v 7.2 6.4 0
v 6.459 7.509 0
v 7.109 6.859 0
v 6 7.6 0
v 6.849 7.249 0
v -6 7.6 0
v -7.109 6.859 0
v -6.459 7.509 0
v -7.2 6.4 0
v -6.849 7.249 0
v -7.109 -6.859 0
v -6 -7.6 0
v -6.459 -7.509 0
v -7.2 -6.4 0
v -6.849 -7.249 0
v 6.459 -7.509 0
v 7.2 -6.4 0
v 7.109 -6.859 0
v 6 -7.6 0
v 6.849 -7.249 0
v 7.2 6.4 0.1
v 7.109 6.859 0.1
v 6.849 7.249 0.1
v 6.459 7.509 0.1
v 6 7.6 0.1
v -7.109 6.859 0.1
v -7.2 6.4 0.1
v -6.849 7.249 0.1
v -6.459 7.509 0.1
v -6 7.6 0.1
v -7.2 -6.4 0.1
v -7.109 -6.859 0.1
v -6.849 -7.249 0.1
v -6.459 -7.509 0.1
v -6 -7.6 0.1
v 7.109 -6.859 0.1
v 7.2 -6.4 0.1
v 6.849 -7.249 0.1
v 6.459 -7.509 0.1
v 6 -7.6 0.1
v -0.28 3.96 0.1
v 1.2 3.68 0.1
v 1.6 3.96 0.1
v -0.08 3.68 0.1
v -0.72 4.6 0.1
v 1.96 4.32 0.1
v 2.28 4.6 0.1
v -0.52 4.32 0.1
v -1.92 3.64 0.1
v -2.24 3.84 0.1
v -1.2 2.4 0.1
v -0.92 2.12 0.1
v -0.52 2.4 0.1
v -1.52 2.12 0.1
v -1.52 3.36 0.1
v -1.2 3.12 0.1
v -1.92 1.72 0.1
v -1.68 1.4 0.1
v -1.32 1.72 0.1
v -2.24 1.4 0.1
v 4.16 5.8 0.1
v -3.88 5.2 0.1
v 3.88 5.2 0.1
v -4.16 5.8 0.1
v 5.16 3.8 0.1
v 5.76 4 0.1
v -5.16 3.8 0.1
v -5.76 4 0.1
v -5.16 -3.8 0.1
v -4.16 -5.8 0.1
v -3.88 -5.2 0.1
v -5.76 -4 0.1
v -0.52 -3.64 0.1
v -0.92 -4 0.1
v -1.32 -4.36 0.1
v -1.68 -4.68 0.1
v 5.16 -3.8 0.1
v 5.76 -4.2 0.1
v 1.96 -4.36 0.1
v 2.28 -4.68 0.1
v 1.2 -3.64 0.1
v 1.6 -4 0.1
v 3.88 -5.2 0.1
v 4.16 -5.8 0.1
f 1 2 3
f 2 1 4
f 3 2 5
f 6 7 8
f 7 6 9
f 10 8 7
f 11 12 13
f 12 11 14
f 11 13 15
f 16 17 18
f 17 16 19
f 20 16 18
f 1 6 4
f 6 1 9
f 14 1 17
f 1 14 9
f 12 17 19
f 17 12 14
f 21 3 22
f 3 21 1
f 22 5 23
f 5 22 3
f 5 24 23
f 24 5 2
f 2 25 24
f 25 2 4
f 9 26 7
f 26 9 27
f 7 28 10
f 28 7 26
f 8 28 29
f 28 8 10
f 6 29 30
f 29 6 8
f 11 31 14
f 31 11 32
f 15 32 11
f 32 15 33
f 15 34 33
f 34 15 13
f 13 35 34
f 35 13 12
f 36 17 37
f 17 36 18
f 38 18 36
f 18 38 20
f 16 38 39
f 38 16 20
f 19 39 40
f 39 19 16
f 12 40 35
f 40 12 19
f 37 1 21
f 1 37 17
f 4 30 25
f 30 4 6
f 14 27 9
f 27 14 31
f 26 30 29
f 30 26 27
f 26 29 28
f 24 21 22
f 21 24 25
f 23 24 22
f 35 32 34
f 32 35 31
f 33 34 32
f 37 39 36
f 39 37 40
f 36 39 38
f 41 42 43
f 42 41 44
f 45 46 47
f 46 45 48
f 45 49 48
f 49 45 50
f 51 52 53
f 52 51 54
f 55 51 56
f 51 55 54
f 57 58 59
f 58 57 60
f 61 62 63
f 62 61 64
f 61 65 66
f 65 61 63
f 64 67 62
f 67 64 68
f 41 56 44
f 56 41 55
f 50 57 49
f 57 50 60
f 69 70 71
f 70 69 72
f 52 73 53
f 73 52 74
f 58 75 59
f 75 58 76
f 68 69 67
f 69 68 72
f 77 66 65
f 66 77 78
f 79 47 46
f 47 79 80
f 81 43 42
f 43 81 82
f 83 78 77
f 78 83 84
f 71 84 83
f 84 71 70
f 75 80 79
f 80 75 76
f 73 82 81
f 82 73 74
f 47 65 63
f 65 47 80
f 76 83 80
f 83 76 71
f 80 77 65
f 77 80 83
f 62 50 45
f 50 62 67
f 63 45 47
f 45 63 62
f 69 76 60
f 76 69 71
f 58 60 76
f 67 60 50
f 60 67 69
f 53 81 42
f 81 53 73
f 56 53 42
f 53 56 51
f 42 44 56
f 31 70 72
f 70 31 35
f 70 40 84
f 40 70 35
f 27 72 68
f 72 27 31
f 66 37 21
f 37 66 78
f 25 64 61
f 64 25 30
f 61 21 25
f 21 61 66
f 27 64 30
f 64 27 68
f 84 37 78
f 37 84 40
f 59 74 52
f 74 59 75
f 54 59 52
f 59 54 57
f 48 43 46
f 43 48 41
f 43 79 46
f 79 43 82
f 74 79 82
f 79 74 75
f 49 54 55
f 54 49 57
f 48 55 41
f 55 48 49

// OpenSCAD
// file: ../p/1-4cyli.scad
use <../lib.scad>
function ldraw_lib__1_4cyli() = [
// 0 Cylinder 0.25
// 0 Name: 1-4cyli.dat
// 0 Author: James Jessiman
// 0 !LDRAW_ORG Primitive UPDATE 2012-01
// 0 !LICENSE Licensed under CC BY 4.0 : see CAreadme.txt
// 
// 0 BFC CERTIFY CCW
  [0,"BFC","CERTIFY"],
  [0,"BFC","CCW"],
// 
// 0 !HISTORY 2002-03-23 [sbliss] Added BFC statement.
// 0 !HISTORY 2002-04-25 [PTadmin] Official Update 2002-02
// 0 !HISTORY 2007-06-22 [PTadmin] Header formatted for Contributor Agreement
// 0 !HISTORY 2008-07-01 [PTadmin] Official Update 2008-01
// 0 !HISTORY 2012-02-16 [Philo] Changed to CCW
// 0 !HISTORY 2012-03-30 [PTadmin] Official Update 2012-01
// 
// 
// 4 16 1 1 0 0.9239 1 0.3827 0.9239 0 0.3827 1 0 0
  [4,16,1,1,0,0.9239,1,0.3827,0.9239,0,0.3827,1,0,0],
// 5 24 1 0 0 1 1 0 0.9239 0 0.3827 1 0 -1
  [5,24,1,0,0,1,1,0,0.9239,0,0.3827,1,0,-1],
// 4 16 0.9239 1 0.3827 0.7071 1 0.7071 0.7071 0 0.7071 0.9239 0 0.3827
  [4,16,0.9239,1,0.3827,0.7071,1,0.7071,0.7071,0,0.7071,0.9239,0,0.3827],
// 5 24 0.9239 0 0.3827 0.9239 1 0.3827 0.7071 0 0.7071 1 0 0
  [5,24,0.9239,0,0.3827,0.9239,1,0.3827,0.7071,0,0.7071,1,0,0],
// 4 16 0.7071 1 0.7071 0.3827 1 0.9239 0.3827 0 0.9239 0.7071 0 0.7071
  [4,16,0.7071,1,0.7071,0.3827,1,0.9239,0.3827,0,0.9239,0.7071,0,0.7071],
// 5 24 0.7071 0 0.7071 0.7071 1 0.7071 0.3827 0 0.9239 0.9239 0 0.3827
  [5,24,0.7071,0,0.7071,0.7071,1,0.7071,0.3827,0,0.9239,0.9239,0,0.3827],
// 4 16 0.3827 1 0.9239 0 1 1 0 0 1 0.3827 0 0.9239
  [4,16,0.3827,1,0.9239,0,1,1,0,0,1,0.3827,0,0.9239],
// 5 24 0.3827 0 0.9239 0.3827 1 0.9239 0 0 1 0.7071 0 0.7071
  [5,24,0.3827,0,0.9239,0.3827,1,0.9239,0,0,1,0.7071,0,0.7071],
// 5 24 0 0 1 0 1 1 0.3827 0 0.9239 -1 0 1
  [5,24,0,0,1,0,1,1,0.3827,0,0.9239,-1,0,1],
];
module ldraw_lib__1_4cyli(step=0, col=false, unit=2/5, alt=false, line=0.2, solid=!$preview)
    makepoly(ldraw_lib__1_4cyli(), step=step, col=col, unit=unit, alt=alt, line=line, solid=solid);
ldraw_lib__1_4cyli(line=0.2);
// file: ../p/1-4chrd.scad
use <../lib.scad>
function ldraw_lib__1_4chrd() = [
// 0 Chord 0.25
// 0 Name: 1-4chrd.dat
// 0 Author: Max Martin Richter [MMR1988]
// 0 !LDRAW_ORG Primitive UPDATE 2023-05
// 0 !LICENSE Licensed under CC BY 4.0 : see CAreadme.txt
// 
// 0 BFC CERTIFY CCW
  [0,"BFC","CERTIFY"],
  [0,"BFC","CCW"],
// 
// 0 !HISTORY 2004-04-22 [PTadmin] Official Update 2004-02
// 0 !HISTORY 2007-10-09 [PTadmin] Header formatted for Contributor Agreement
// 0 !HISTORY 2008-07-01 [PTadmin] Official Update 2008-01
// 0 !HISTORY 2012-08-02 [MMR1988] Re-creation with PrimGen2 and Rectifier
// 0 !HISTORY 2012-08-09 [PTadmin] Official Update 2012-02
// 0 !HISTORY 2023-10-27 [OrionP] Change author to MMR1988 from hafhead
// 0 !HISTORY 2023-10-31 [OrionP] Official Update 2023-05
// 
// 4 16 0.9239 0 0.3827 0.3827 0 0.9239 0 0 1 1 0 0
  [4,16,0.9239,0,0.3827,0.3827,0,0.9239,0,0,1,1,0,0],
// 3 16 0.7071 0 0.7071 0.3827 0 0.9239 0.9239 0 0.3827
  [3,16,0.7071,0,0.7071,0.3827,0,0.9239,0.9239,0,0.3827],
];
module ldraw_lib__1_4chrd(step=0, col=false, unit=2/5, alt=false, line=0.2, solid=!$preview)
    makepoly(ldraw_lib__1_4chrd(), step=step, col=col, unit=unit, alt=alt, line=line, solid=solid);
ldraw_lib__1_4chrd(line=0.2);
// main file
use <../lib.scad>
use <../p/1-4chrd.scad>
use <../p/1-4cyli.scad>
function ldraw_lib__6237277a() = [
// 0 Sticker  1.9 x  1.8 with Red Number '1' on Blue Panel on Yellow Background
// 0 Name: 6237277a.dat
// 0 Author: Alex Herrera [alanbrito98]
// 0 !LDRAW_ORG Part UPDATE 2024-03
// 0 !LICENSE Licensed under CC BY 4.0 : see CAreadme.txt
// 
// 0 BFC CERTIFY CCW
  [0,"BFC","CERTIFY"],
  [0,"BFC","CCW"],
// 
// 0 !KEYWORDS Bricklink 21311stk01, Brickowl 227694, Rebrickable 39754, set 21311
// 0 !KEYWORDS Voltron
// 
// 0 !HISTORY 2021-11-04 [Holly-Wood] Adjusted hight
// 0 !HISTORY 2024-04-28 [OrionP] Official Update 2024-03
// 
// 0 // Box
// 0 // Bottom
// 0 // Primitives
// 1 16 15 0 16 3 0 0 0 -1 0 0 0 3 1-4chrd.dat
  [1,16,15,0,16,3,0,0,0,-1,0,0,0,3, ldraw_lib__1_4chrd()],
// 1 16 -15 0 16 -3 0 0 0 -1 0 0 0 3 1-4chrd.dat
  [1,16,-15,0,16,-3,0,0,0,-1,0,0,0,3, ldraw_lib__1_4chrd()],
// 1 16 -15 0 -16 -3 0 0 0 -1 0 0 0 -3 1-4chrd.dat
  [1,16,-15,0,-16,-3,0,0,0,-1,0,0,0,-3, ldraw_lib__1_4chrd()],
// 1 16 15 0 -16 3 0 0 0 -1 0 0 0 -3 1-4chrd.dat
  [1,16,15,0,-16,3,0,0,0,-1,0,0,0,-3, ldraw_lib__1_4chrd()],
// 0 // Bottom Faces
// 4 16 18 0 16 -18 0 16 -15 0 19 15 0 19
  [4,16,18,0,16,-18,0,16,-15,0,19,15,0,19],
// 4 16 -18 0 -16 -18 0 16 18 0 16 18 0 -16
  [4,16,-18,0,-16,-18,0,16,18,0,16,18,0,-16],
// 4 16 15 0 -19 -15 0 -19 -18 0 -16 18 0 -16
  [4,16,15,0,-19,-15,0,-19,-18,0,-16,18,0,-16],
// 0 // Sides
// 0 // Primitives
// 1 16 15 0 16 3 0 0 0 -.25 0 0 0 3 1-4cyli.dat
  [1,16,15,0,16,3,0,0,0,-.25,0,0,0,3, ldraw_lib__1_4cyli()],
// 1 16 -15 0 16 -3 0 0 0 -.25 0 0 0 3 1-4cyli.dat
  [1,16,-15,0,16,-3,0,0,0,-.25,0,0,0,3, ldraw_lib__1_4cyli()],
// 1 16 -15 0 -16 -3 0 0 0 -.25 0 0 0 -3 1-4cyli.dat
  [1,16,-15,0,-16,-3,0,0,0,-.25,0,0,0,-3, ldraw_lib__1_4cyli()],
// 1 16 15 0 -16 3 0 0 0 -.25 0 0 0 -3 1-4cyli.dat
  [1,16,15,0,-16,3,0,0,0,-.25,0,0,0,-3, ldraw_lib__1_4cyli()],
// 0 // Side Faces
// 4 16 -15 0 -19 15 0 -19 15 -.25 -19 -15 -.25 -19
  [4,16,-15,0,-19,15,0,-19,15,-.25,-19,-15,-.25,-19],
// 4 16 18 0 -16 18 0 16 18 -.25 16 18 -.25 -16
  [4,16,18,0,-16,18,0,16,18,-.25,16,18,-.25,-16],
// 4 16 15 0 19 -15 0 19 -15 -.25 19 15 -.25 19
  [4,16,15,0,19,-15,0,19,-15,-.25,19,15,-.25,19],
// 4 16 -18 0 16 -18 0 -16 -18 -.25 -16 -18 -.25 16
  [4,16,-18,0,16,-18,0,-16,-18,-.25,-16,-18,-.25,16],
// 
// 0 // Primitives
// 1 14 -15 -.25 16 -3 0 0 0 1 0 0 0 3 1-4chrd.dat
  [1,14,-15,-.25,16,-3,0,0,0,1,0,0,0,3, ldraw_lib__1_4chrd()],
// 1 14 15 -.25 16 3 0 0 0 1 0 0 0 3 1-4chrd.dat
  [1,14,15,-.25,16,3,0,0,0,1,0,0,0,3, ldraw_lib__1_4chrd()],
// 1 14 -15 -.25 -16 -3 0 0 0 1 0 0 0 -3 1-4chrd.dat
  [1,14,-15,-.25,-16,-3,0,0,0,1,0,0,0,-3, ldraw_lib__1_4chrd()],
// 1 14 15 -.25 -16 3 0 0 0 1 0 0 0 -3 1-4chrd.dat
  [1,14,15,-.25,-16,3,0,0,0,1,0,0,0,-3, ldraw_lib__1_4chrd()],
// 0 // Pattern
// 0 // Black
// 4 0 -.2 -.25 9.2 3 -.25 9.2 4 -.25 9.9 -.7 -.25 9.9
  [4,0,-.2,-.25,9.2,3,-.25,9.2,4,-.25,9.9,-.7,-.25,9.9],
// 4 0 -1.3 -.25 10.8 4.9 -.25 10.8 5.7 -.25 11.5 -1.8 -.25 11.5
  [4,0,-1.3,-.25,10.8,4.9,-.25,10.8,5.7,-.25,11.5,-1.8,-.25,11.5],
// 4 0 -1.3 -.25 10.8 -1.8 -.25 11.5 -5.6 -.25 9.6 -4.8 -.25 9.1
  [4,0,-1.3,-.25,10.8,-1.8,-.25,11.5,-5.6,-.25,9.6,-4.8,-.25,9.1],
// 4 0 -1.3 -.25 6 -3 -.25 6 -3.8 -.25 5.3 -2.3 -.25 5.3
  [4,0,-1.3,-.25,6,-3,-.25,6,-3.8,-.25,5.3,-2.3,-.25,5.3],
// 4 0 -3.8 -.25 5.3 -3 -.25 6 -3 -.25 7.8 -3.8 -.25 8.4
  [4,0,-3.8,-.25,5.3,-3,-.25,6,-3,-.25,7.8,-3.8,-.25,8.4],
// 4 0 -5.6 -.25 3.5 -4.2 -.25 3.5 -3.3 -.25 4.3 -4.8 -.25 4.3
  [4,0,-5.6,-.25,3.5,-4.2,-.25,3.5,-3.3,-.25,4.3,-4.8,-.25,4.3],
// 4 0 -9.7 -.25 13 9.7 -.25 13 10.4 -.25 14.5 -10.4 -.25 14.5
  [4,0,-9.7,-.25,13,9.7,-.25,13,10.4,-.25,14.5,-10.4,-.25,14.5],
// 4 0 14.4 -.25 10 10.4 -.25 14.5 9.7 -.25 13 12.9 -.25 9.5
  [4,0,14.4,-.25,10,10.4,-.25,14.5,9.7,-.25,13,12.9,-.25,9.5],
// 4 0 -9.7 -.25 13 -10.4 -.25 14.5 -14.4 -.25 10 -12.9 -.25 9.5
  [4,0,-9.7,-.25,13,-10.4,-.25,14.5,-14.4,-.25,10,-12.9,-.25,9.5],
// 4 0 -.7 -.25 9.9 -3.8 -.25 8.4 -3 -.25 7.8 -.2 -.25 9.2
  [4,0,-.7,-.25,9.9,-3.8,-.25,8.4,-3,-.25,7.8,-.2,-.25,9.2],
// 4 0 -5.6 -.25 9.6 -5.6 -.25 3.5 -4.8 -.25 4.3 -4.8 -.25 9.1
  [4,0,-5.6,-.25,9.6,-5.6,-.25,3.5,-4.8,-.25,4.3,-4.8,-.25,9.1],
// 4 0 -14.4 -.25 -10 -10.4 -.25 -14.5 -9.7 -.25 -13 -12.9 -.25 -9.5
  [4,0,-14.4,-.25,-10,-10.4,-.25,-14.5,-9.7,-.25,-13,-12.9,-.25,-9.5],
// 4 0 -2.3 -.25 -10 -1.3 -.25 -9.1 -1.3 -.25 6 -2.3 -.25 5.3
  [4,0,-2.3,-.25,-10,-1.3,-.25,-9.1,-1.3,-.25,6,-2.3,-.25,5.3],
// 4 0 -4.2 -.25 -11.7 -3.3 -.25 -10.9 -3.3 -.25 4.3 -4.2 -.25 3.5
  [4,0,-4.2,-.25,-11.7,-3.3,-.25,-10.9,-3.3,-.25,4.3,-4.2,-.25,3.5],
// 4 0 -14.4 -.25 -10 -12.9 -.25 -9.5 -12.9 -.25 9.5 -14.4 -.25 10
  [4,0,-14.4,-.25,-10,-12.9,-.25,-9.5,-12.9,-.25,9.5,-14.4,-.25,10],
// 4 0 12.9 -.25 -9.5 14.4 -.25 -10.5 14.4 -.25 10 12.9 -.25 9.5
  [4,0,12.9,-.25,-9.5,14.4,-.25,-10.5,14.4,-.25,10,12.9,-.25,9.5],
// 4 0 4.9 -.25 -10.9 5.7 -.25 -11.7 5.7 -.25 11.5 4.9 -.25 10.8
  [4,0,4.9,-.25,-10.9,5.7,-.25,-11.7,5.7,-.25,11.5,4.9,-.25,10.8],
// 4 0 3 -.25 -9.1 4 -.25 -10 4 -.25 9.9 3 -.25 9.2
  [4,0,3,-.25,-9.1,4,-.25,-10,4,-.25,9.9,3,-.25,9.2],
// 4 0 14.4 -.25 -10.5 12.9 -.25 -9.5 9.7 -.25 -13 10.4 -.25 -14.5
  [4,0,14.4,-.25,-10.5,12.9,-.25,-9.5,9.7,-.25,-13,10.4,-.25,-14.5],
// 4 0 -10.4 -.25 -14.5 10.4 -.25 -14.5 9.7 -.25 -13 -9.7 -.25 -13
  [4,0,-10.4,-.25,-14.5,10.4,-.25,-14.5,9.7,-.25,-13,-9.7,-.25,-13],
// 4 0 -3.3 -.25 -10.9 -4.2 -.25 -11.7 5.7 -.25 -11.7 4.9 -.25 -10.9
  [4,0,-3.3,-.25,-10.9,-4.2,-.25,-11.7,5.7,-.25,-11.7,4.9,-.25,-10.9],
// 4 0 4 -.25 -10 3 -.25 -9.1 -1.3 -.25 -9.1 -2.3 -.25 -10
  [4,0,4,-.25,-10,3,-.25,-9.1,-1.3,-.25,-9.1,-2.3,-.25,-10],
// 0 // Blue
// 4 1 12.9 -.25 9.5 9.7 -.25 13 5.7 -.25 11.5 5.7 -.25 -11.7
  [4,1,12.9,-.25,9.5,9.7,-.25,13,5.7,-.25,11.5,5.7,-.25,-11.7],
// 4 1 9.7 -.25 -13 5.7 -.25 -11.7 -4.2 -.25 -11.7 -9.7 -.25 -13
  [4,1,9.7,-.25,-13,5.7,-.25,-11.7,-4.2,-.25,-11.7,-9.7,-.25,-13],
// 4 1 5.7 -.25 -11.7 9.7 -.25 -13 12.9 -.25 -9.5 12.9 -.25 9.5
  [4,1,5.7,-.25,-11.7,9.7,-.25,-13,12.9,-.25,-9.5,12.9,-.25,9.5],
// 4 1 -1.8 -.25 11.5 -9.7 -.25 13 -12.9 -.25 9.5 -5.6 -.25 9.6
  [4,1,-1.8,-.25,11.5,-9.7,-.25,13,-12.9,-.25,9.5,-5.6,-.25,9.6],
// 4 1 -1.8 -.25 11.5 5.7 -.25 11.5 9.7 -.25 13 -9.7 -.25 13
  [4,1,-1.8,-.25,11.5,5.7,-.25,11.5,9.7,-.25,13,-9.7,-.25,13],
// 4 1 -12.9 -.25 -9.5 -9.7 -.25 -13 -4.2 -.25 -11.7 -5.6 -.25 3.5
  [4,1,-12.9,-.25,-9.5,-9.7,-.25,-13,-4.2,-.25,-11.7,-5.6,-.25,3.5],
// 3 1 -4.2 -.25 3.5 -5.6 -.25 3.5 -4.2 -.25 -11.7
  [3,1,-4.2,-.25,3.5,-5.6,-.25,3.5,-4.2,-.25,-11.7],
// 4 1 -12.9 -.25 9.5 -12.9 -.25 -9.5 -5.6 -.25 3.5 -5.6 -.25 9.6
  [4,1,-12.9,-.25,9.5,-12.9,-.25,-9.5,-5.6,-.25,3.5,-5.6,-.25,9.6],
// 0 // Red
// 4 4 -1.3 -.25 6 -1.3 -.25 -9.1 3 -.25 -9.1 3 -.25 9.2
  [4,4,-1.3,-.25,6,-1.3,-.25,-9.1,3,-.25,-9.1,3,-.25,9.2],
// 4 4 -3 -.25 7.8 -3 -.25 6 -1.3 -.25 6 3 -.25 9.2
  [4,4,-3,-.25,7.8,-3,-.25,6,-1.3,-.25,6,3,-.25,9.2],
// 3 4 3 -.25 9.2 -.2 -.25 9.2 -3 -.25 7.8
  [3,4,3,-.25,9.2,-.2,-.25,9.2,-3,-.25,7.8],
// 0 // Yellow
// 4 14 -15 -.25 -19 -10.4 -.25 -14.5 -14.4 -.25 -10 -18 -.25 -16
  [4,14,-15,-.25,-19,-10.4,-.25,-14.5,-14.4,-.25,-10,-18,-.25,-16],
// 4 14 15 -.25 -19 10.4 -.25 -14.5 -10.4 -.25 -14.5 -15 -.25 -19
  [4,14,15,-.25,-19,10.4,-.25,-14.5,-10.4,-.25,-14.5,-15,-.25,-19],
// 4 14 -14.4 -.25 -10 -14.4 -.25 10 -18 -.25 16 -18 -.25 -16
  [4,14,-14.4,-.25,-10,-14.4,-.25,10,-18,-.25,16,-18,-.25,-16],
// 4 14 18 -.25 16 14.4 -.25 10 14.4 -.25 -10.5 18 -.25 -16
  [4,14,18,-.25,16,14.4,-.25,10,14.4,-.25,-10.5,18,-.25,-16],
// 4 14 15 -.25 19 -15 -.25 19 -10.4 -.25 14.5 10.4 -.25 14.5
  [4,14,15,-.25,19,-15,-.25,19,-10.4,-.25,14.5,10.4,-.25,14.5],
// 4 14 18 -.25 16 15 -.25 19 10.4 -.25 14.5 14.4 -.25 10
  [4,14,18,-.25,16,15,-.25,19,10.4,-.25,14.5,14.4,-.25,10],
// 4 14 -15 -.25 19 -18 -.25 16 -14.4 -.25 10 -10.4 -.25 14.5
  [4,14,-15,-.25,19,-18,-.25,16,-14.4,-.25,10,-10.4,-.25,14.5],
// 4 14 10.4 -.25 -14.5 15 -.25 -19 18 -.25 -16 14.4 -.25 -10.5
  [4,14,10.4,-.25,-14.5,15,-.25,-19,18,-.25,-16,14.4,-.25,-10.5],
// 0 // White
// 4 15 -3.3 -.25 -10.9 -2.3 -.25 -10 -2.3 -.25 5.3 -3.3 -.25 4.3
  [4,15,-3.3,-.25,-10.9,-2.3,-.25,-10,-2.3,-.25,5.3,-3.3,-.25,4.3],
// 4 15 -4.8 -.25 4.3 -3.3 -.25 4.3 -2.3 -.25 5.3 -3.8 -.25 5.3
  [4,15,-4.8,-.25,4.3,-3.3,-.25,4.3,-2.3,-.25,5.3,-3.8,-.25,5.3],
// 4 15 -.7 -.25 9.9 4 -.25 9.9 4.9 -.25 10.8 -1.3 -.25 10.8
  [4,15,-.7,-.25,9.9,4,-.25,9.9,4.9,-.25,10.8,-1.3,-.25,10.8],
// 4 15 4 -.25 -10 4.9 -.25 -10.9 4.9 -.25 10.8 4 -.25 9.9
  [4,15,4,-.25,-10,4.9,-.25,-10.9,4.9,-.25,10.8,4,-.25,9.9],
// 4 15 -2.3 -.25 -10 -3.3 -.25 -10.9 4.9 -.25 -10.9 4 -.25 -10
  [4,15,-2.3,-.25,-10,-3.3,-.25,-10.9,4.9,-.25,-10.9,4,-.25,-10],
// 4 15 -4.8 -.25 4.3 -3.8 -.25 5.3 -3.8 -.25 8.4 -4.8 -.25 9.1
  [4,15,-4.8,-.25,4.3,-3.8,-.25,5.3,-3.8,-.25,8.4,-4.8,-.25,9.1],
// 4 15 -.7 -.25 9.9 -1.3 -.25 10.8 -4.8 -.25 9.1 -3.8 -.25 8.4
  [4,15,-.7,-.25,9.9,-1.3,-.25,10.8,-4.8,-.25,9.1,-3.8,-.25,8.4],
];
module ldraw_lib__6237277a(step=0, col=false, unit=2/5, alt=false, line=0.2, solid=!$preview)
    makepoly(ldraw_lib__6237277a(), step=step, col=col, unit=unit, alt=alt, line=line, solid=solid);
ldraw_lib__6237277a(line=0.2);
